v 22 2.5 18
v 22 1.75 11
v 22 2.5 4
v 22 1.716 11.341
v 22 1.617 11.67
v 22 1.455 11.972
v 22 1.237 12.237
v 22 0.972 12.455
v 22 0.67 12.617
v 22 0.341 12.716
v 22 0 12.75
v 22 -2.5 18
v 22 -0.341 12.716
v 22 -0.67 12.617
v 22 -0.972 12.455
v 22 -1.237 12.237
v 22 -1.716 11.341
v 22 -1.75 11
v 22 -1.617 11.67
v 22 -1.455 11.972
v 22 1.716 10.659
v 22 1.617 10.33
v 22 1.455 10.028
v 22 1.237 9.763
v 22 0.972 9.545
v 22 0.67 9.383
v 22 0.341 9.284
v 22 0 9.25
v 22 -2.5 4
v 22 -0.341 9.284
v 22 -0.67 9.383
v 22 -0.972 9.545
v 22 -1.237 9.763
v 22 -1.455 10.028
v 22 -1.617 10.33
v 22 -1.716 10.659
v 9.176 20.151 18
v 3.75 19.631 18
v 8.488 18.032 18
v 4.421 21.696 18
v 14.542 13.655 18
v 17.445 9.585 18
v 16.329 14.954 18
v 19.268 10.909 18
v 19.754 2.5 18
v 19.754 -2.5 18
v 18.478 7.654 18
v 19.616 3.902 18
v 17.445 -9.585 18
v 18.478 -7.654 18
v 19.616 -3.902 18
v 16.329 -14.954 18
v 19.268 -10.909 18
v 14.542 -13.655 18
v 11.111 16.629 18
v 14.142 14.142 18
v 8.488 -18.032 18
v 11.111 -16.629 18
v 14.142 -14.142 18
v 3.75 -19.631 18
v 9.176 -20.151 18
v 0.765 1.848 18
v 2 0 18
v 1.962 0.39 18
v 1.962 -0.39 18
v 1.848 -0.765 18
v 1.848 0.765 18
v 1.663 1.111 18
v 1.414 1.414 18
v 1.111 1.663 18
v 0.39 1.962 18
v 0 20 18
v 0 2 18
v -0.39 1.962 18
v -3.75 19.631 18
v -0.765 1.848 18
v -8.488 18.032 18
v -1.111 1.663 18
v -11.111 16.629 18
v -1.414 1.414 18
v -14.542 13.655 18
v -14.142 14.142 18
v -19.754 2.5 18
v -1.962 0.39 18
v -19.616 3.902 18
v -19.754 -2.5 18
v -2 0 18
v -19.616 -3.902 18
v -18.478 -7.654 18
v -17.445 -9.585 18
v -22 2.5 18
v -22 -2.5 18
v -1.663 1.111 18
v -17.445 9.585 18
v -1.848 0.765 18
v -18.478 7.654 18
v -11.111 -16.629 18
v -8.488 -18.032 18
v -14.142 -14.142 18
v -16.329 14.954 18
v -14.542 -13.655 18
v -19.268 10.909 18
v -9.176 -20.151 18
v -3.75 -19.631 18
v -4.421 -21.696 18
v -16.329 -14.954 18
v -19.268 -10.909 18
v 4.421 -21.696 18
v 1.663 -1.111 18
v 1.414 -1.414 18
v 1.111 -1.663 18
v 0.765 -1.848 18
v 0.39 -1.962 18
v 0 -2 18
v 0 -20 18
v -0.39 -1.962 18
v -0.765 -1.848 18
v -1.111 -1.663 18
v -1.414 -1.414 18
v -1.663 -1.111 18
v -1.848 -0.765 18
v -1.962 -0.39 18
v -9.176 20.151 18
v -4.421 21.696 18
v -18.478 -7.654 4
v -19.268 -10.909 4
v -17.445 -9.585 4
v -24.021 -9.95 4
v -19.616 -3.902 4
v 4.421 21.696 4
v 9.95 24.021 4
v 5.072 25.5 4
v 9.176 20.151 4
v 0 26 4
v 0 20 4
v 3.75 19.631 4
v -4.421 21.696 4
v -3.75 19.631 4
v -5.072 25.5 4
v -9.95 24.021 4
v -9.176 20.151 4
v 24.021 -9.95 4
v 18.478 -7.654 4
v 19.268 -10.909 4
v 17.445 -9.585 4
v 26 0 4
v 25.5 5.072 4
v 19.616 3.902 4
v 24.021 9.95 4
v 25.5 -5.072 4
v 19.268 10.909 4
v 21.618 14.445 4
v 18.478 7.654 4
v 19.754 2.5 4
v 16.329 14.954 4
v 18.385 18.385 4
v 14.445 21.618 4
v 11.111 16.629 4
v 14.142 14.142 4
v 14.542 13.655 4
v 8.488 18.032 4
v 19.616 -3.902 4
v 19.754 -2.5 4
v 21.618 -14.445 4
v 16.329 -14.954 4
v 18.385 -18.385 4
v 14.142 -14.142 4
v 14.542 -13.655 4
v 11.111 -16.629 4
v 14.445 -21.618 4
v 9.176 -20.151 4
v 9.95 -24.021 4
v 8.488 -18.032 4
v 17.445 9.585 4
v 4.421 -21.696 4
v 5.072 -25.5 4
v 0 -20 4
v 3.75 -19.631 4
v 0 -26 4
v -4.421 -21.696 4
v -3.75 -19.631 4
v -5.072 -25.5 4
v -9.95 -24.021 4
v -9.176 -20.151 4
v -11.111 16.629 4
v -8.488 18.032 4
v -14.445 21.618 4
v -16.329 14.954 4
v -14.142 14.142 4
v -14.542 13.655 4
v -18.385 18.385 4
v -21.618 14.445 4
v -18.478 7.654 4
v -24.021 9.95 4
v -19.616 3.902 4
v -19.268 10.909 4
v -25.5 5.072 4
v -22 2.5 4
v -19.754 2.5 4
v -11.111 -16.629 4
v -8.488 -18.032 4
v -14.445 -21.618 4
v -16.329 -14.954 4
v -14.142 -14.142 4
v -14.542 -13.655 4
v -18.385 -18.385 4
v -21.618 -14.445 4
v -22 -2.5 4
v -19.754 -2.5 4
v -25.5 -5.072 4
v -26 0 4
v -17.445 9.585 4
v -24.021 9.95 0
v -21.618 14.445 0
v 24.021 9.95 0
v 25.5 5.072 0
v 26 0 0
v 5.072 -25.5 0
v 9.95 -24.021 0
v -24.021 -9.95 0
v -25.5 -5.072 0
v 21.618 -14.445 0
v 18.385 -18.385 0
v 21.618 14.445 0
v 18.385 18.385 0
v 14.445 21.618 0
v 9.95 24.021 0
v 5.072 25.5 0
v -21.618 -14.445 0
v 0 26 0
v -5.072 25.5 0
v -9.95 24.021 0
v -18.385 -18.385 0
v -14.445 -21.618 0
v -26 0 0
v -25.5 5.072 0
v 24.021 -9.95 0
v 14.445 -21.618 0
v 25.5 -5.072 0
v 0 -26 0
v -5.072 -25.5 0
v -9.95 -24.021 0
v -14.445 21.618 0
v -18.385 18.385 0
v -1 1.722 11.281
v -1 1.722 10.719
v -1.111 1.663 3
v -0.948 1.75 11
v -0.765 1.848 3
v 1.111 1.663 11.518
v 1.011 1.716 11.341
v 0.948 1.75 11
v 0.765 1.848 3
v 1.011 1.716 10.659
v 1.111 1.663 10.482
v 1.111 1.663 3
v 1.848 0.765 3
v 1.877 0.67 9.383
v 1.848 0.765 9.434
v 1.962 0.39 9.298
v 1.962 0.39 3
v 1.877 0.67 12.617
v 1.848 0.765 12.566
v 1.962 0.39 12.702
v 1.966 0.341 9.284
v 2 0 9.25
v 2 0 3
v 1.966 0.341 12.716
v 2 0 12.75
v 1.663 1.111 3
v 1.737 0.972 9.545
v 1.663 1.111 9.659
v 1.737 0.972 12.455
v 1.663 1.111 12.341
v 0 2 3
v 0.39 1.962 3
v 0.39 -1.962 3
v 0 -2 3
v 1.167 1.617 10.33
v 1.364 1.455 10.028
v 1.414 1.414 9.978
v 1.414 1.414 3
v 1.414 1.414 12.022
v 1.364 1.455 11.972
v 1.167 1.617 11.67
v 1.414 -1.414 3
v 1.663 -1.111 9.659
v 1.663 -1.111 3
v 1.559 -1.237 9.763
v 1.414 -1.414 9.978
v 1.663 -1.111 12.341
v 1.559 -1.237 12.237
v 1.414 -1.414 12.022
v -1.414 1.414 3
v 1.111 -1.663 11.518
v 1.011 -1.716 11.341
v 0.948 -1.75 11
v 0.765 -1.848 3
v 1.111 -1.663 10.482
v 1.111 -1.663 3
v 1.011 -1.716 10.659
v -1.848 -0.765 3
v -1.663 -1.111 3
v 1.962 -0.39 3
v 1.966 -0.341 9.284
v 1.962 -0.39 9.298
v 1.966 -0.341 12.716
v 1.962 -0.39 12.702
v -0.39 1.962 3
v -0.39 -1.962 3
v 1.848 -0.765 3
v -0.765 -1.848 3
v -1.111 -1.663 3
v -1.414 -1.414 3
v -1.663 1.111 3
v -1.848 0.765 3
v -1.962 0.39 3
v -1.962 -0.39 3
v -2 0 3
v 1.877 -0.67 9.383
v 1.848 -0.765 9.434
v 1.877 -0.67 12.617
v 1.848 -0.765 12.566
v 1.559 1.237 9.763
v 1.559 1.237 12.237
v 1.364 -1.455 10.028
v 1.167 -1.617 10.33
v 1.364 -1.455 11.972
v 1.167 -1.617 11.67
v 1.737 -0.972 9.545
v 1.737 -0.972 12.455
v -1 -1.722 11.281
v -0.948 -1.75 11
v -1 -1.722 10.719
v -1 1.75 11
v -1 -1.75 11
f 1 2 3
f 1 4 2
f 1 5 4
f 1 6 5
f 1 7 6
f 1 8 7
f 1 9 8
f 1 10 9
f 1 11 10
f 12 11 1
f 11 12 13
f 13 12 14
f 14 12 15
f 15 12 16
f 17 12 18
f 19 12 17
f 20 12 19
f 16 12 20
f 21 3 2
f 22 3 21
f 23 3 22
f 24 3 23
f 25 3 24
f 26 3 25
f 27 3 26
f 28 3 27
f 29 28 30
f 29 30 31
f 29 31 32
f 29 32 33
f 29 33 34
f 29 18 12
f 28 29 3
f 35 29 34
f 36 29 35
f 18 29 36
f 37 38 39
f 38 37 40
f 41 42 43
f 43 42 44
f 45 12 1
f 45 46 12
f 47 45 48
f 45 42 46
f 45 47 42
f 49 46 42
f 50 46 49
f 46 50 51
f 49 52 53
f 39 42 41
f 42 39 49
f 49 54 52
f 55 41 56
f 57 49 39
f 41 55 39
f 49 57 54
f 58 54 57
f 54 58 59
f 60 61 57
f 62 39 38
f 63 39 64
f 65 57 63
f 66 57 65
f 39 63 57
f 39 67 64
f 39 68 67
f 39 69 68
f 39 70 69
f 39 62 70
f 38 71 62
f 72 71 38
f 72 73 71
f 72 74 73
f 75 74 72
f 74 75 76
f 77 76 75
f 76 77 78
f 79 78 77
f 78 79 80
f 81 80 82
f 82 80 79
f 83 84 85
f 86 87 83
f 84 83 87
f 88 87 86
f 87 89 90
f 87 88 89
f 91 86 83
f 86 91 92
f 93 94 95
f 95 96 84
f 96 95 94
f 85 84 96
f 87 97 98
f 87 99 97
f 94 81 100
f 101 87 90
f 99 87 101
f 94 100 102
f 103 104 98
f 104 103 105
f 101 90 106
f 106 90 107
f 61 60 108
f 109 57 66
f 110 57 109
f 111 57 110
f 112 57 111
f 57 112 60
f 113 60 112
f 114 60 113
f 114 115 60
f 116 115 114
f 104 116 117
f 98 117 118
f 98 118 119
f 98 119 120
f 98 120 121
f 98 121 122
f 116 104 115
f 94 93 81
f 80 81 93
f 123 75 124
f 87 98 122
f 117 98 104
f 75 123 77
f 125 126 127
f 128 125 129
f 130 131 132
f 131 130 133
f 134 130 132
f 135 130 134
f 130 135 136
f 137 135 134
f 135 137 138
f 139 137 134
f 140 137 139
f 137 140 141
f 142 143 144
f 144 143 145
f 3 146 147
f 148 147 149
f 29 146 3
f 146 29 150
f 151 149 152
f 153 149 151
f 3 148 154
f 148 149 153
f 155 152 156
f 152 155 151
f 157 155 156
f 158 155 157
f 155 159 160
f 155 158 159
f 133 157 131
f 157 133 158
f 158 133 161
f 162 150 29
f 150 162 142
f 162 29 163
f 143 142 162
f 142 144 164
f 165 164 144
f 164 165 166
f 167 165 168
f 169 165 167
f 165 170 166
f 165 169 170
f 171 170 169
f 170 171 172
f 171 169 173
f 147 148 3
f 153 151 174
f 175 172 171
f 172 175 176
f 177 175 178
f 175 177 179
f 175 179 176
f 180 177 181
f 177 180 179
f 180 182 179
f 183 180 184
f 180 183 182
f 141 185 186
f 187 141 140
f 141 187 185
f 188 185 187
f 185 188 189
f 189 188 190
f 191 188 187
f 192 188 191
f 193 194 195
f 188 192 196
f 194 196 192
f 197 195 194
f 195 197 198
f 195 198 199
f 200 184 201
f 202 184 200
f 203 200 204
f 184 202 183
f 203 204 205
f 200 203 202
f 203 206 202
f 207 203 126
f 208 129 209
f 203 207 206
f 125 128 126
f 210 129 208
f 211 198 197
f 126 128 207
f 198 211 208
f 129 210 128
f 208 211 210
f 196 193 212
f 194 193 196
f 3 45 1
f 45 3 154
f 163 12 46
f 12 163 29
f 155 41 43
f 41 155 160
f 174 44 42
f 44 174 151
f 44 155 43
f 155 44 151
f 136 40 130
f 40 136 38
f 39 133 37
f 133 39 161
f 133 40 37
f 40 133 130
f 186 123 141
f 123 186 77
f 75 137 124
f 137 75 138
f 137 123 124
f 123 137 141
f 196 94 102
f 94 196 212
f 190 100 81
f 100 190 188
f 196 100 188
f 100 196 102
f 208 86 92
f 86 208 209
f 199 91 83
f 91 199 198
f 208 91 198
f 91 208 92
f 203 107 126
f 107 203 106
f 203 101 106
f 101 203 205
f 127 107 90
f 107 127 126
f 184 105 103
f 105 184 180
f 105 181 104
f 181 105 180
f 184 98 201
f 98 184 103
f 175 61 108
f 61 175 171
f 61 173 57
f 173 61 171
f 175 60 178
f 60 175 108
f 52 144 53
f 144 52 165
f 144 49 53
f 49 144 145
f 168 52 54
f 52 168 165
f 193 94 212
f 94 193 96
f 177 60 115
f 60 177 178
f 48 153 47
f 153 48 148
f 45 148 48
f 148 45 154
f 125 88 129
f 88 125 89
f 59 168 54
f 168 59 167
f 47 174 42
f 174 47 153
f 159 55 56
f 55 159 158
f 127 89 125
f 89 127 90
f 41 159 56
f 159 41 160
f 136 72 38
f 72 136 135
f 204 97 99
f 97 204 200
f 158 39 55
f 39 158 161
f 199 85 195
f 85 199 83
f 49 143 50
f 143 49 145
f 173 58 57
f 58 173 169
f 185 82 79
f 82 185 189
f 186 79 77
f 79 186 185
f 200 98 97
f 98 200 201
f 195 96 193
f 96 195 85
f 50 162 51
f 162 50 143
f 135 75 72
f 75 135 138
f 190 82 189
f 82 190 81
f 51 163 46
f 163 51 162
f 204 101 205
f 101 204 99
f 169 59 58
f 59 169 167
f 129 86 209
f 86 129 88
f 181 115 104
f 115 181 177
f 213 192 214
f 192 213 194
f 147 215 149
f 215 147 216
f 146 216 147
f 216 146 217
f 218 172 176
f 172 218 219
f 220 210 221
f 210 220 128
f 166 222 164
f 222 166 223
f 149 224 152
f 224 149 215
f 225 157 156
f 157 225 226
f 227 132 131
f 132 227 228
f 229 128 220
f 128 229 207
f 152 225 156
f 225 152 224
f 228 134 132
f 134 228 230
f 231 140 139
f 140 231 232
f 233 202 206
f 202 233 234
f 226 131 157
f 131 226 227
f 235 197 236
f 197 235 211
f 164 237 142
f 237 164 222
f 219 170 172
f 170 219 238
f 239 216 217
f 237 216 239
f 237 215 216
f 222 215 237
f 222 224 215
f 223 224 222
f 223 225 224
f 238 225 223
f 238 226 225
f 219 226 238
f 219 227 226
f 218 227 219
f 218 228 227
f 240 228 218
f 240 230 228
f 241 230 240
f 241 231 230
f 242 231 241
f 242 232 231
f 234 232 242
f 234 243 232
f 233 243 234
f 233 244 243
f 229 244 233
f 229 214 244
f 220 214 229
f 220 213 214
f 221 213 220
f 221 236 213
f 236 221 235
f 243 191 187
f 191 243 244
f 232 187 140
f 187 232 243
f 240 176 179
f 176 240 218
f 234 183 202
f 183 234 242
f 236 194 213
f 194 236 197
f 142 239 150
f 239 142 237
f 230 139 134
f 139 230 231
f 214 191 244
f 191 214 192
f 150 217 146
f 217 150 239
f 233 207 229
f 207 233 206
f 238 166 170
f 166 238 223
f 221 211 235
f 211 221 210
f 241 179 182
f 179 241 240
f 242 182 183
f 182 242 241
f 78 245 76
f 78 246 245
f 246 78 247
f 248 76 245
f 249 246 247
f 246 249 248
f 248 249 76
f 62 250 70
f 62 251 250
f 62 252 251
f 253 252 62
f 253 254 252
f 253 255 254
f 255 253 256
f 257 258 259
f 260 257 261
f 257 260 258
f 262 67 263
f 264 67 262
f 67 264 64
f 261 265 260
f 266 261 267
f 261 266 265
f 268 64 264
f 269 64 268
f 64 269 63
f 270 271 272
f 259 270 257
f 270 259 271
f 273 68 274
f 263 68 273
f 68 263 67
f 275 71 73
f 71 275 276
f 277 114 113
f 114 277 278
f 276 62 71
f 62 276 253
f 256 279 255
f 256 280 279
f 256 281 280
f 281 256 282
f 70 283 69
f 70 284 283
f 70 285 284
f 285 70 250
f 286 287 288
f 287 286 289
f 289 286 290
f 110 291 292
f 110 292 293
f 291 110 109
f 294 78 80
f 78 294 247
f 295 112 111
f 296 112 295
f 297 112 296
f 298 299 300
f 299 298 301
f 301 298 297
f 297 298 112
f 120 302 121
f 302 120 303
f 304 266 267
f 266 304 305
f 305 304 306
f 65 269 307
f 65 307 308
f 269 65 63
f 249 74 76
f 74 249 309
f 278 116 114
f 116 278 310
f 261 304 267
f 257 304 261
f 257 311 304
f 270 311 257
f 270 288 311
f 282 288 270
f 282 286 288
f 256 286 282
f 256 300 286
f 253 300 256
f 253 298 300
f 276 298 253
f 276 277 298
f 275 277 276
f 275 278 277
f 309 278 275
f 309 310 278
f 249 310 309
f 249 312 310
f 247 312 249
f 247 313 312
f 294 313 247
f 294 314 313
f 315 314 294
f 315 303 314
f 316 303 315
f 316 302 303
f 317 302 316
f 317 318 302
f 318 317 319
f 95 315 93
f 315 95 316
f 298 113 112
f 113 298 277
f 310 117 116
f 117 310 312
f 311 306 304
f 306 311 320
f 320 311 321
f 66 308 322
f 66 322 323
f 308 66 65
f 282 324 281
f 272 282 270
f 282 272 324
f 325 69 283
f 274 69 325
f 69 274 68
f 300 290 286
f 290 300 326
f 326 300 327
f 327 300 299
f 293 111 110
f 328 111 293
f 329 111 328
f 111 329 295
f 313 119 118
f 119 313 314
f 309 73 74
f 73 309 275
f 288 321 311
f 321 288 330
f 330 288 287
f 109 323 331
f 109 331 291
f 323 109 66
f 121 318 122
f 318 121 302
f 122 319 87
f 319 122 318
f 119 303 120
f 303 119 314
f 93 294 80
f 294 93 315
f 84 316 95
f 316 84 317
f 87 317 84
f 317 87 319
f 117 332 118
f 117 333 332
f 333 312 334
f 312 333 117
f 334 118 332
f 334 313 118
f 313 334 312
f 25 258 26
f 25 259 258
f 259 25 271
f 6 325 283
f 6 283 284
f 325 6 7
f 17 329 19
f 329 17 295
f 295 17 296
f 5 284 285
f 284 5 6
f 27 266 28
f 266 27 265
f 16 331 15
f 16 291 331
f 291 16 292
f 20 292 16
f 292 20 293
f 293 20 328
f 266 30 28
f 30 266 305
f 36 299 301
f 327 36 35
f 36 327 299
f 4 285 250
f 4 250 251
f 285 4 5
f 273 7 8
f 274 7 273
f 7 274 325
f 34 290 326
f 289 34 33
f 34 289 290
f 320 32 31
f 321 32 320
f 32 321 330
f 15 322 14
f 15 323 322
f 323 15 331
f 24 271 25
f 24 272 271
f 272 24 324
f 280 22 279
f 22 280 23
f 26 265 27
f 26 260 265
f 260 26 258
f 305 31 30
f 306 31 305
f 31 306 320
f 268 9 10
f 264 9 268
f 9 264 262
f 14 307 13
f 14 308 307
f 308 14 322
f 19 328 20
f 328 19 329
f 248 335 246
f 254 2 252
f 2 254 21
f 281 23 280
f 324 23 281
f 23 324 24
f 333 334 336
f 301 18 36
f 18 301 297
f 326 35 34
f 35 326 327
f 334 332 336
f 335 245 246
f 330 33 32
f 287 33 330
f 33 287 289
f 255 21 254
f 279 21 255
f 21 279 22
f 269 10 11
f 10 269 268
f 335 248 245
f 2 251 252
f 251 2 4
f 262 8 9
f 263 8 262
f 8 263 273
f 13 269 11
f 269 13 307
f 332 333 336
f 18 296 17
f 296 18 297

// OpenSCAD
$fn = 32;

// ----------------------------------------------------------------------
// Control knob: skirt knob with grip ribs
// ----------------------------------------------------------------------

// --- parameters (mm) ---
skirt_d = 52;             // skirt diameter
skirt_t = 4;              // skirt thickness
rib_w = 5;                // grip rib width
rib_out = 3;              // grip rib radial protrusion
n_ribs = 10;              // number of grip ribs
knob_d = 40;              // knob body diameter
knob_h = 14;              // knob body height
bore_d = 4;               // shaft bore diameter
set_d = 3.5;              // set screw bore diameter
fit_tol = 0.02;           // tolerance for press fits, mm
free_tol = 0.2;           // tolerance for clearance fits, mm

rib_step = 360 / n_ribs;  // rib angular step
total_h = skirt_t + knob_h;  // overall height

difference() {
  union() {
    translate([0, 0, skirt_t]) cylinder(h = knob_h, d = knob_d);
    cylinder(h = skirt_t, d = skirt_d);
    for (i = [0 : n_ribs - 1])
      rotate([0, 0, i * rib_step])
        translate([knob_d / 2 - 1, -rib_w / 2, skirt_t])
          cube([rib_out, rib_w, knob_h]);
  }
  translate([0, 0, skirt_t - 1]) cylinder(h = knob_h + 2, d = bore_d);
  translate([-1, 0, skirt_t + knob_h / 2]) rotate([0, 90, 0])
    cylinder(h = knob_d / 2 + bore_d / 2 + 2, d = set_d);
}
